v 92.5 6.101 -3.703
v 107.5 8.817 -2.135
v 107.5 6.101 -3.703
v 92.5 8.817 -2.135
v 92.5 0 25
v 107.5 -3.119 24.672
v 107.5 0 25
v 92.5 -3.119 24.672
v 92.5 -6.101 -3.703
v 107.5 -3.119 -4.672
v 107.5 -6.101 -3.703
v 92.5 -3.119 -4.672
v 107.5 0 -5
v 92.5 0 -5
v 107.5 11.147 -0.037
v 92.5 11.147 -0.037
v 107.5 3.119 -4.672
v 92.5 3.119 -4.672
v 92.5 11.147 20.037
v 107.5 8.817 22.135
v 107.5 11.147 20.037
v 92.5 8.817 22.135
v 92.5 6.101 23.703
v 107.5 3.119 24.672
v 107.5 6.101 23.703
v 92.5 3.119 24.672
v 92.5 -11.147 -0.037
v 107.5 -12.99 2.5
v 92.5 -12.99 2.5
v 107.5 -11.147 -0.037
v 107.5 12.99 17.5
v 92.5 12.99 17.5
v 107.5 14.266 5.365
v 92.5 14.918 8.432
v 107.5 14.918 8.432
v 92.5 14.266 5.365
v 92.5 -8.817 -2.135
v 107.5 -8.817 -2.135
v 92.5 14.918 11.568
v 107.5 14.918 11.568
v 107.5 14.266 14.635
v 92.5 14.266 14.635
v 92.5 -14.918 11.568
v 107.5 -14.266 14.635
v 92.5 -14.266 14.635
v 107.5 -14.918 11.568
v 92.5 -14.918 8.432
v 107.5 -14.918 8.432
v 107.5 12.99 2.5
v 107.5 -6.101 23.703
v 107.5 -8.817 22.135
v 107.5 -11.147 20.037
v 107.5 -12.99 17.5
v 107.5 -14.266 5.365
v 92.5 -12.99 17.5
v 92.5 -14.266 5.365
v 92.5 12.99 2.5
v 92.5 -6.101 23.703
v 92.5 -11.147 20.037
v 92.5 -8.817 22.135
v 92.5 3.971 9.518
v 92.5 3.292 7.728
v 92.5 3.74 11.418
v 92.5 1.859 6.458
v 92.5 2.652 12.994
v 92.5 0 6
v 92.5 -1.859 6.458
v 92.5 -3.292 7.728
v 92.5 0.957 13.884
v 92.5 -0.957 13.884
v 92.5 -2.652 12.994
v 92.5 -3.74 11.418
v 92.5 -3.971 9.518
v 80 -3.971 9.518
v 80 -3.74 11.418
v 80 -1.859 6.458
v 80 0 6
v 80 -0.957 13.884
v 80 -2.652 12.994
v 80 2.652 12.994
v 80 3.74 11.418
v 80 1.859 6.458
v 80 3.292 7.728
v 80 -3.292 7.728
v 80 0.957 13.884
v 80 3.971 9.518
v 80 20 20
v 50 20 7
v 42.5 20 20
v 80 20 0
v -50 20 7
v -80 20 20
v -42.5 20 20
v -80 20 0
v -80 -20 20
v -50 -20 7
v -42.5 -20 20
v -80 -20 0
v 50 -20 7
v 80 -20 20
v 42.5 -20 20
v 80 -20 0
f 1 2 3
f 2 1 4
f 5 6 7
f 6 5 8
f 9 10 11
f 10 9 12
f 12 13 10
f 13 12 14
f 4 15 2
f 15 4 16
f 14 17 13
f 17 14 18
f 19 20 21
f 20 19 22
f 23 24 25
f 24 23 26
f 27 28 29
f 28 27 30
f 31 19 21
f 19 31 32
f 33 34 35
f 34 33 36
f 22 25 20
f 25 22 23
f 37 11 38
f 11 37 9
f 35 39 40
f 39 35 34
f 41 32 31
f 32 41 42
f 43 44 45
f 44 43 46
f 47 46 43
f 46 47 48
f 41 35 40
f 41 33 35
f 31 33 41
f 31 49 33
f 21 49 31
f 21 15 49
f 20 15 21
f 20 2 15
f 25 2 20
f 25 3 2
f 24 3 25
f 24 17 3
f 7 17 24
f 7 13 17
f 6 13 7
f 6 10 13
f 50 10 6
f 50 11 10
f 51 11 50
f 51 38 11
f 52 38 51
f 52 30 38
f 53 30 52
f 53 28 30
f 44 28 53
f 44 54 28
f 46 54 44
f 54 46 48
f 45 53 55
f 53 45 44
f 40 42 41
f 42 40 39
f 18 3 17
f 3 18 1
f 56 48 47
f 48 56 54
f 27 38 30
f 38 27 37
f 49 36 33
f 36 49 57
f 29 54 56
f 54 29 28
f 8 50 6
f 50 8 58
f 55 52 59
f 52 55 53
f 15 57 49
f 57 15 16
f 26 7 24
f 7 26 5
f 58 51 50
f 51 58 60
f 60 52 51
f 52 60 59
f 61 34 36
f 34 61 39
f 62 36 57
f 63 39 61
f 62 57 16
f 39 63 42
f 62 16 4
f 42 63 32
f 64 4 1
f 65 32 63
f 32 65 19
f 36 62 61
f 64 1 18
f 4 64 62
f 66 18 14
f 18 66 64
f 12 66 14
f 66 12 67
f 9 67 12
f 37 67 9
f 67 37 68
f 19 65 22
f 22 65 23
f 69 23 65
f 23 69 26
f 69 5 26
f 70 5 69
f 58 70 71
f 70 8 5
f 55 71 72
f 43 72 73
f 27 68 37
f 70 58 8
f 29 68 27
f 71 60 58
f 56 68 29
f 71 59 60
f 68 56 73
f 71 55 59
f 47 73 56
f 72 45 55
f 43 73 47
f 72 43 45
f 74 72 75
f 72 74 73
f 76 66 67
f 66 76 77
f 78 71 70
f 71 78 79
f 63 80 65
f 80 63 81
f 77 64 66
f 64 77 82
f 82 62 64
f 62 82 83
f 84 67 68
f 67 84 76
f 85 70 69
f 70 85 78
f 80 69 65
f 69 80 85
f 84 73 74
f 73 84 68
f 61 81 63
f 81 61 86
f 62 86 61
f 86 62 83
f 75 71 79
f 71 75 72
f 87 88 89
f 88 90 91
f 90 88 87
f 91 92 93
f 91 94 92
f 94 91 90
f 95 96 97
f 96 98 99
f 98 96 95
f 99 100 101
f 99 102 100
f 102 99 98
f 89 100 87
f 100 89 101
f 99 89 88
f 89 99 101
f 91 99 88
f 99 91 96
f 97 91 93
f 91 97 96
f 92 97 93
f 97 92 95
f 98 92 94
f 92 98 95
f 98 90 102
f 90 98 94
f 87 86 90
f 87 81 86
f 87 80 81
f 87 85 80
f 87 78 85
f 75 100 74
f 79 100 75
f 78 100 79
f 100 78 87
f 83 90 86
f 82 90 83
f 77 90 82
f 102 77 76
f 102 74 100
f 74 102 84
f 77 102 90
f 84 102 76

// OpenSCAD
//模块 -  安装望远镜的鸠尾槽
tail_for_telescope_width=160;
tail_for_telescope_thickness=20;
tail_for_telescope_cut1_length=85;
tail_for_telescope_cut2_length=100;
tail_for_telescope_cut3_thickness=7;


losmandy_style_dovetail_saddle(40,1);
module losmandy_style_dovetail_saddle(tail_for_telescope_length,position){
    
    if(position==1){
    //旋转把手
    translate([tail_for_telescope_width/2+20,0,tail_for_telescope_thickness/2])
    rotate([0,90,0])
    cylinder(h=15,d=30,center=true);
    
        translate([tail_for_telescope_width/2-5+10,0,tail_for_telescope_thickness/2])
    rotate([0,90,0])
    cylinder(h=15,d=8,center=true);}
    else
    {
          //旋转把手
    translate([-tail_for_telescope_width/2-20,tail_for_telescope_length/4,tail_for_telescope_thickness/2])
    rotate([0,90,0])
    cylinder(h=15,d=30,center=true);
    
        translate([-tail_for_telescope_width/2-5,tail_for_telescope_length/4,tail_for_telescope_thickness/2])
    rotate([0,90,0])
    cylinder(h=15,d=8,center=true);  
        
        translate([-tail_for_telescope_width/2-20,-tail_for_telescope_length/4,tail_for_telescope_thickness/2])
    rotate([0,90,0])
    cylinder(h=15,d=30,center=true);
    
        translate([-tail_for_telescope_width/2-5,-tail_for_telescope_length/4,tail_for_telescope_thickness/2])
    rotate([0,90,0])
    cylinder(h=15,d=8,center=true);  
        }
    
    //槽面
    color("silver")
    translate([-tail_for_telescope_width/2,tail_for_telescope_length/2,])
    rotate([90,0,0])
linear_extrude(tail_for_telescope_length)
 polygon(points=[[0,0],[tail_for_telescope_width,0],
 
 //右上角
 [tail_for_telescope_width,tail_for_telescope_thickness],
 [tail_for_telescope_width-(tail_for_telescope_width-tail_for_telescope_cut1_length)/2,tail_for_telescope_thickness],
 
  [tail_for_telescope_width-(tail_for_telescope_width-tail_for_telescope_cut2_length)/2,tail_for_telescope_cut3_thickness],
  
    [(tail_for_telescope_width-tail_for_telescope_cut2_length)/2,tail_for_telescope_cut3_thickness],
    
    
     [(tail_for_telescope_width-tail_for_telescope_cut1_length)/2,tail_for_telescope_thickness],
 //左上角
  [0,tail_for_telescope_thickness],
 ]);}
